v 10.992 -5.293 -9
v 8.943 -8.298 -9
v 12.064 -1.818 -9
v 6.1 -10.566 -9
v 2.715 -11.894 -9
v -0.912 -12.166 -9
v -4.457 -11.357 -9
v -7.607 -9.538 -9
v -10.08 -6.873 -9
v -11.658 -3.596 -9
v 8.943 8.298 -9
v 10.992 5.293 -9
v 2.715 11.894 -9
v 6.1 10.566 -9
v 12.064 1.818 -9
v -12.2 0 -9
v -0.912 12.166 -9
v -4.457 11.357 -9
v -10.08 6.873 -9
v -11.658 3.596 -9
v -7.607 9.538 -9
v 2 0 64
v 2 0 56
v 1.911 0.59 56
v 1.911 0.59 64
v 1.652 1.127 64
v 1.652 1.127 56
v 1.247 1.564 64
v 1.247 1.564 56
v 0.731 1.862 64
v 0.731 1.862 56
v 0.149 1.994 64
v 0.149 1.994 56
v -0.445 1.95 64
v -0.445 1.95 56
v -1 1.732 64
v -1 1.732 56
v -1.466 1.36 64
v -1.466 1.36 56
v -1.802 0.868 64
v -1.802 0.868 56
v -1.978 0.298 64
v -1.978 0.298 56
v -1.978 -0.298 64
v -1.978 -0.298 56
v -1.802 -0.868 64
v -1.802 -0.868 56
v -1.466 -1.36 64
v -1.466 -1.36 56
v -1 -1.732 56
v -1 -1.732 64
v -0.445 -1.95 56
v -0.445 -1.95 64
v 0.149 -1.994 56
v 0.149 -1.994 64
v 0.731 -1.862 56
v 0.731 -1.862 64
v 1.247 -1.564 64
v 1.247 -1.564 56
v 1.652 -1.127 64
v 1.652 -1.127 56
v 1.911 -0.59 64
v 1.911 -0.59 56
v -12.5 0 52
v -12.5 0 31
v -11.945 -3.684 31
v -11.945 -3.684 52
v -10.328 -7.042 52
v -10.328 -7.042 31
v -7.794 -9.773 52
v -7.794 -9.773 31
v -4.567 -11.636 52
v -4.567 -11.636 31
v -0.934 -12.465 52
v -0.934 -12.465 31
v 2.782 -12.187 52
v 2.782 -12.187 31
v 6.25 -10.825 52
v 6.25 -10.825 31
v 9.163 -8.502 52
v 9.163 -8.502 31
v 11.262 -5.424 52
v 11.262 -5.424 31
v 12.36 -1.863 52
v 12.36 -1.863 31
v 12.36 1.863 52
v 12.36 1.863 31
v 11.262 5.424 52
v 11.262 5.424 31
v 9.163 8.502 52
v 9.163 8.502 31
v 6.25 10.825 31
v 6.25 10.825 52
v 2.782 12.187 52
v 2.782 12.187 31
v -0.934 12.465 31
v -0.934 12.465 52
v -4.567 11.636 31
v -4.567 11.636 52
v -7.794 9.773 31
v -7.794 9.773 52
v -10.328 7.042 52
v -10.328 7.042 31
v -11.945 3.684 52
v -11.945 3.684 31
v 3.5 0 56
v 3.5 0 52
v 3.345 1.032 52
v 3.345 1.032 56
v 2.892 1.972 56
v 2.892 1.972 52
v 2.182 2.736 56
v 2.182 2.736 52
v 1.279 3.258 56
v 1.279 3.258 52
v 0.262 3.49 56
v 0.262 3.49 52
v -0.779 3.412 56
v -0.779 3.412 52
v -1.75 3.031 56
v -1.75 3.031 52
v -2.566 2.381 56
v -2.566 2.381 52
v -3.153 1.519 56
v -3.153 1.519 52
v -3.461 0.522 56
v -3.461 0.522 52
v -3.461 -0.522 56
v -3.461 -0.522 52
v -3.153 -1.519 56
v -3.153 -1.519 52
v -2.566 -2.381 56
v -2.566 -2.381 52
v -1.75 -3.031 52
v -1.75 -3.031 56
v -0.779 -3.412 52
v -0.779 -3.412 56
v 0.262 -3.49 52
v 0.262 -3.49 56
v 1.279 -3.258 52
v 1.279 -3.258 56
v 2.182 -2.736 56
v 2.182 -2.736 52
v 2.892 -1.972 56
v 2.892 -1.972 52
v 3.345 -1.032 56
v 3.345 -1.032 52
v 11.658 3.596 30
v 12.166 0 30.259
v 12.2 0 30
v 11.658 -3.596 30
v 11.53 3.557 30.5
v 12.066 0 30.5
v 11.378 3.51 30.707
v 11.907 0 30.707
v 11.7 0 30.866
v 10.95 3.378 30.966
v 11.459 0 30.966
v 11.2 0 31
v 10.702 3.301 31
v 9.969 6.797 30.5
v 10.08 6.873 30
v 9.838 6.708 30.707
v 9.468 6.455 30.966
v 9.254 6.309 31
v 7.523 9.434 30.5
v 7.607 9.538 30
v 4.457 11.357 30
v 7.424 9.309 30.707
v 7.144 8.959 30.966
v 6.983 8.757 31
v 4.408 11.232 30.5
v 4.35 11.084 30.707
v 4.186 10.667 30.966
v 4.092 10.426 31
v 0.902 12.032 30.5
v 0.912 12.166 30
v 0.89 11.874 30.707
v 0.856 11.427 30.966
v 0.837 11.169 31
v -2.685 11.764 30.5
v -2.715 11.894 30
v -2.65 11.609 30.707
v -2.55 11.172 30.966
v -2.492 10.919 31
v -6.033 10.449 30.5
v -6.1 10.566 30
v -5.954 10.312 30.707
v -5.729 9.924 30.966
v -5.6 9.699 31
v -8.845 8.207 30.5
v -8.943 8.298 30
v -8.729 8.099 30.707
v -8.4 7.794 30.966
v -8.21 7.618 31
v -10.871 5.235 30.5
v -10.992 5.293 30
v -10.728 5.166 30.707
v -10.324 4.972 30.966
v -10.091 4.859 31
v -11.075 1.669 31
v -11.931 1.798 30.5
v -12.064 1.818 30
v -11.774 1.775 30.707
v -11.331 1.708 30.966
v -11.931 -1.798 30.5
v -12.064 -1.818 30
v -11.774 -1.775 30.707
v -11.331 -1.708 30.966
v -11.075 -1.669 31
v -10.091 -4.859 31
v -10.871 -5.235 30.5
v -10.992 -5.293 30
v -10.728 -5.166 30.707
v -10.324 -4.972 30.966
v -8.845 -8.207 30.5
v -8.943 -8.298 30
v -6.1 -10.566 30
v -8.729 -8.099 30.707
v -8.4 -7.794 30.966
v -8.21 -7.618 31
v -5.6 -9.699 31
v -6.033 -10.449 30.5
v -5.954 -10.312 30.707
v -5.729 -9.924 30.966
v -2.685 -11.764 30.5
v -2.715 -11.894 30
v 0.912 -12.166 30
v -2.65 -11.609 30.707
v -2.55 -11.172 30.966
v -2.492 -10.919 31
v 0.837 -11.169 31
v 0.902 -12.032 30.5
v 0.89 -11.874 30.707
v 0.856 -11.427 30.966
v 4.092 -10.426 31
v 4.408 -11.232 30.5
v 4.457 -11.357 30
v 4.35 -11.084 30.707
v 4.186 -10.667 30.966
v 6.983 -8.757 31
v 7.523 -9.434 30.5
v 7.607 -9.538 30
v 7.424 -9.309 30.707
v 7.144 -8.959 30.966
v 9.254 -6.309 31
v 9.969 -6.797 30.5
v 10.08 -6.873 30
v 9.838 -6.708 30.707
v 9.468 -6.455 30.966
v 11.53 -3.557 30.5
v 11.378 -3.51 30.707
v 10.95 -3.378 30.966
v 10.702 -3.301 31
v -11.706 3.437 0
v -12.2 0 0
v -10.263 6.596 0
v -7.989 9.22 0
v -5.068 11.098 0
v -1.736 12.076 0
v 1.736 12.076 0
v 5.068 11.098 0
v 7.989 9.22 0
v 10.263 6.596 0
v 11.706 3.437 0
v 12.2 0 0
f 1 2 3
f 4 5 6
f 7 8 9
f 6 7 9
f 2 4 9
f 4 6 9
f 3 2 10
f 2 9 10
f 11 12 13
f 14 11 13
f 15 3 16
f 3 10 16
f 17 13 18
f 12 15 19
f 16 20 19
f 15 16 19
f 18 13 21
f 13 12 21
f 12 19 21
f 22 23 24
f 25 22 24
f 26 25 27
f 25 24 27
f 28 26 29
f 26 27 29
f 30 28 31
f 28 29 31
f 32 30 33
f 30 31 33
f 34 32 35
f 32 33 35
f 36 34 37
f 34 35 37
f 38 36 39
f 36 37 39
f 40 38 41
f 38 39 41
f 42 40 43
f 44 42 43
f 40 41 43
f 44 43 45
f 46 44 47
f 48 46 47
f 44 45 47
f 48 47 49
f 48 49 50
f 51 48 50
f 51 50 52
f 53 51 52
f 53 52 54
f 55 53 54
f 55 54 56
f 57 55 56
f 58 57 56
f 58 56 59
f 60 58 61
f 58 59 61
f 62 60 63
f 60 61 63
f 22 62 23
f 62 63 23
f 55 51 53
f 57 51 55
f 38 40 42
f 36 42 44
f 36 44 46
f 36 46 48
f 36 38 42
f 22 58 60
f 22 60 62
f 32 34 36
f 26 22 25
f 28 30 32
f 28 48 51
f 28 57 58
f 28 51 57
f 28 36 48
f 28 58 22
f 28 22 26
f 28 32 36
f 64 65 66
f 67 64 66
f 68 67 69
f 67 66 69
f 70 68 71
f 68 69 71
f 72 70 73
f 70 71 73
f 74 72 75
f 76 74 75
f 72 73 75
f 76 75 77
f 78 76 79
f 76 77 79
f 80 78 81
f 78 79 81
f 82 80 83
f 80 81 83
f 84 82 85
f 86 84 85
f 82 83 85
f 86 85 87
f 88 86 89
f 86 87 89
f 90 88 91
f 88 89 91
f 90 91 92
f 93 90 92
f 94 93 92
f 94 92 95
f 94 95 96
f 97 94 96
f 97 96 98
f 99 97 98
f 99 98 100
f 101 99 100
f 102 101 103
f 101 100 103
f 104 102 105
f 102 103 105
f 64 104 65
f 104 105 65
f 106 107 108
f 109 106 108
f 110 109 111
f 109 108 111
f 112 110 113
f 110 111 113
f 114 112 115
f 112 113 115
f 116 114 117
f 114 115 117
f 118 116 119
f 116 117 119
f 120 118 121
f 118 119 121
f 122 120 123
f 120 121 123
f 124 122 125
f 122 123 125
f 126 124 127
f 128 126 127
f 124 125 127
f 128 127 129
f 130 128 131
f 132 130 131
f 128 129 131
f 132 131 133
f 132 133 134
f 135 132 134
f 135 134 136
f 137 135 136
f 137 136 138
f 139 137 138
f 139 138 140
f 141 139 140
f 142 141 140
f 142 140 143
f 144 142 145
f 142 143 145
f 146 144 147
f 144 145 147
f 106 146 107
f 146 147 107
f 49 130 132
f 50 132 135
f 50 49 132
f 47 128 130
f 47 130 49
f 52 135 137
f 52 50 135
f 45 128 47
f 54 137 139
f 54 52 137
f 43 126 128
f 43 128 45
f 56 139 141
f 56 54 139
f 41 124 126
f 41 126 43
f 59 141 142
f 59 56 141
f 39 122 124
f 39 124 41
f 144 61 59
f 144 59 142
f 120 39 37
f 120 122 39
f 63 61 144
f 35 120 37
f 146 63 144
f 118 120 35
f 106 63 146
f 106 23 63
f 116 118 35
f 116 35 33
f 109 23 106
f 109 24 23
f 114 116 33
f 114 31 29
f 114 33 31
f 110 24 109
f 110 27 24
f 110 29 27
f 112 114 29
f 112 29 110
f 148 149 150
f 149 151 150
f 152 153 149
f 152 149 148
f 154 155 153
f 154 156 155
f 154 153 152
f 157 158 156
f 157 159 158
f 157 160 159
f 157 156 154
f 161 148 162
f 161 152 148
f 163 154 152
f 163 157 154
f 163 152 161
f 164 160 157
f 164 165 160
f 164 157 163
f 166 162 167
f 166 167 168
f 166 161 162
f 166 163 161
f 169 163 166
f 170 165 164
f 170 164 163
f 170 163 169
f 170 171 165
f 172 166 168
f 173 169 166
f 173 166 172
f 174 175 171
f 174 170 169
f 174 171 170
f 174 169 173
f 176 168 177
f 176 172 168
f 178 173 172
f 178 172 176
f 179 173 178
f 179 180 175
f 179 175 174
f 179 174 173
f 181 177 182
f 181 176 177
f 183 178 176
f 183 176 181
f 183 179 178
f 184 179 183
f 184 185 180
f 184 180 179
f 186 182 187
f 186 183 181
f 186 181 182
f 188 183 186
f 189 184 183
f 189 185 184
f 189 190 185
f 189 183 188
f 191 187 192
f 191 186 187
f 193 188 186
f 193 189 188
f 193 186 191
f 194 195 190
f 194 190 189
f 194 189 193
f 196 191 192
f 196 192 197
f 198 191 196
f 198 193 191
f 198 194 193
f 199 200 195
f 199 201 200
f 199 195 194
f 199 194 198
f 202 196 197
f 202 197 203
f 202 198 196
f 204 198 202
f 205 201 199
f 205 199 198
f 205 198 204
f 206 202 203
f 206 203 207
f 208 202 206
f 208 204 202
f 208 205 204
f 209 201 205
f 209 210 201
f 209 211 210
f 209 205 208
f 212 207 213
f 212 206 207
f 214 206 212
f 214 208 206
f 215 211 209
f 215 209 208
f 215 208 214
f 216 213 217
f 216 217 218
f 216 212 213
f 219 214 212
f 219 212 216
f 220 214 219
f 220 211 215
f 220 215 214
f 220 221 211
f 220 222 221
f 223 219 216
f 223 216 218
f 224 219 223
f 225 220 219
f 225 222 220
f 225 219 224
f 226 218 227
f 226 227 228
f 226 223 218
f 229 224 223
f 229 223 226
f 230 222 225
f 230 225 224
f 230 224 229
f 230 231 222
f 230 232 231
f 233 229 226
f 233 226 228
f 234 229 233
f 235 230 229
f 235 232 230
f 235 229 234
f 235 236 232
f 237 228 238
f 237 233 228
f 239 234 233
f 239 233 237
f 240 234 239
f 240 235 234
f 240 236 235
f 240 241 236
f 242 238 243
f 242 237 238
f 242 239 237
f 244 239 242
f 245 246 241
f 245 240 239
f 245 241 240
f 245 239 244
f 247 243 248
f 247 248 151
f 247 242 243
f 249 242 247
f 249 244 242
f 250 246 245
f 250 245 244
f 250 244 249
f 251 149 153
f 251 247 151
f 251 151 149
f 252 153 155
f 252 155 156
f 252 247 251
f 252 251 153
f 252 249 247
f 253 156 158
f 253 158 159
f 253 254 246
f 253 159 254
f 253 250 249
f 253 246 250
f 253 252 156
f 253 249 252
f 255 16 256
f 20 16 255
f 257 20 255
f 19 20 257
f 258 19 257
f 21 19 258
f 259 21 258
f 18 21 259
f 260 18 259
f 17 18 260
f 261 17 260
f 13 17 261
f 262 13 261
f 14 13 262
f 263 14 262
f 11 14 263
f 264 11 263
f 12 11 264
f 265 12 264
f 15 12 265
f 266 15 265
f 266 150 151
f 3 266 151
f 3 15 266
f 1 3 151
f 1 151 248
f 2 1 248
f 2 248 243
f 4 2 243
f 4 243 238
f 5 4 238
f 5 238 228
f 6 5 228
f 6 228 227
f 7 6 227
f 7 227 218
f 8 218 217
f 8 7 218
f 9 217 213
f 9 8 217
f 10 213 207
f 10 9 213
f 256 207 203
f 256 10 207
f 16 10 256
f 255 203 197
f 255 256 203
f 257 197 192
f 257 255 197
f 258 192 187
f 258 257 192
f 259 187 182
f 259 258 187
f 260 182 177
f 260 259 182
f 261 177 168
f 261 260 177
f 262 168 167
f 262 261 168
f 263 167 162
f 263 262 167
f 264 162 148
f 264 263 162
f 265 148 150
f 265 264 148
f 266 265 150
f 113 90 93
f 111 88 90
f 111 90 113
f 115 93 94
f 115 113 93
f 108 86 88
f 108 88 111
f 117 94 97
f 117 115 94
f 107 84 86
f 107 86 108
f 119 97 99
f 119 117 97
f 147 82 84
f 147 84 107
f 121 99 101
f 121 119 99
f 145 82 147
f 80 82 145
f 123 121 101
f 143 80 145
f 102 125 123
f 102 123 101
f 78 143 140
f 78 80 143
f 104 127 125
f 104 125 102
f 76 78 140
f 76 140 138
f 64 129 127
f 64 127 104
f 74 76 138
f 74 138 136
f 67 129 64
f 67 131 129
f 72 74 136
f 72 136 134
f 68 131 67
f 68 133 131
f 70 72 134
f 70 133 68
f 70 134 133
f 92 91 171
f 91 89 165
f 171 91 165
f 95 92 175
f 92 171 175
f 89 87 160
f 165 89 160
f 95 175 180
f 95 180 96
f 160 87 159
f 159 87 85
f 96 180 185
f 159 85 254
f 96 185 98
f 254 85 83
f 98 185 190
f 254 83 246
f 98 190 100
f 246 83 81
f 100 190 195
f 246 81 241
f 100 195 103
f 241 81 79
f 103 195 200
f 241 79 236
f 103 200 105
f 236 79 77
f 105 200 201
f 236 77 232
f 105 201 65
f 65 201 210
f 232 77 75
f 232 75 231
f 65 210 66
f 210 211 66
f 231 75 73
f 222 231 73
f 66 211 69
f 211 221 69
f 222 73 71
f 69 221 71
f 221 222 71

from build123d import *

# Parameters (mm, degrees)
SKETCH2_R               = 12.2
BOSS_EXTRUDE1_DEPTH     = 31
FILLET1_R               = 1
SKETCH3_R               = 12.5
BOSS_EXTRUDE2_DEPTH     = 21
SKETCH4_R               = 3.5
BOSS_EXTRUDE3_DEPTH     = 4
SKETCH5_R               = 2
BOSS_EXTRUDE4_DEPTH     = 8
BOSS_EXTRUDE5_START     = 10
SKETCH6_R               = 12.2
BOSS_EXTRUDE5_DEPTH     = 10
CUT_EXTRUDE1_DEPTH      = 20
CUT_EXTRUDE1_DEPTH_BACK = 19
SKETCH7_W               = 2.212937173
SKETCH7_H               = 31.307930015


with BuildPart() as part:
    # Sketch2 → Boss-Extrude1 (new body)
    with BuildSketch(Plane.XY):
        Circle(SKETCH2_R)
    extrude(amount=BOSS_EXTRUDE1_DEPTH)

    # Fillet1
    fillet1_edges = [part.edges().sort_by_distance(p)[0] for p in [
        (-12.2, 0, 31),
    ]]
    fillet(fillet1_edges, radius=FILLET1_R)

    # Sketch3 → Boss-Extrude2 (add)
    with BuildSketch(Plane.XY.offset(31)):
        with Locations(Location((0, 0, 0), (0, 0, 180))):
            Circle(SKETCH3_R)
    extrude(amount=BOSS_EXTRUDE2_DEPTH)

    # Sketch4 → Boss-Extrude3 (add)
    with BuildSketch(Plane.XY.offset(52)):
        Circle(SKETCH4_R)
    extrude(amount=BOSS_EXTRUDE3_DEPTH)

    # Sketch5 → Boss-Extrude4 (add)
    with BuildSketch(Plane.XY.offset(56)):
        Circle(SKETCH5_R)
    extrude(amount=BOSS_EXTRUDE4_DEPTH)

    # Sketch6 → Boss-Extrude5 (add)
    with BuildSketch(Plane(origin=(0, 0, 0), x_dir=(-1, 0, 0), z_dir=(0, 0, -1)).offset(BOSS_EXTRUDE5_START)):
        Circle(SKETCH6_R)
    extrude(amount=-BOSS_EXTRUDE5_DEPTH)

    # Sketch7 → Cut-Extrude1 (cut, two sides: drawn at the far end of the back side and taken through both)
    with BuildSketch(Plane(origin=(0, 0, 0), x_dir=(0, 0, -1), z_dir=(1, 0, 0)).offset(-CUT_EXTRUDE1_DEPTH_BACK)):
        with Locations((10.106468587, 3.153965008)):
            Rectangle(SKETCH7_W, SKETCH7_H)
    extrude(amount=CUT_EXTRUDE1_DEPTH + CUT_EXTRUDE1_DEPTH_BACK, mode=Mode.SUBTRACT)


solid = part.part
